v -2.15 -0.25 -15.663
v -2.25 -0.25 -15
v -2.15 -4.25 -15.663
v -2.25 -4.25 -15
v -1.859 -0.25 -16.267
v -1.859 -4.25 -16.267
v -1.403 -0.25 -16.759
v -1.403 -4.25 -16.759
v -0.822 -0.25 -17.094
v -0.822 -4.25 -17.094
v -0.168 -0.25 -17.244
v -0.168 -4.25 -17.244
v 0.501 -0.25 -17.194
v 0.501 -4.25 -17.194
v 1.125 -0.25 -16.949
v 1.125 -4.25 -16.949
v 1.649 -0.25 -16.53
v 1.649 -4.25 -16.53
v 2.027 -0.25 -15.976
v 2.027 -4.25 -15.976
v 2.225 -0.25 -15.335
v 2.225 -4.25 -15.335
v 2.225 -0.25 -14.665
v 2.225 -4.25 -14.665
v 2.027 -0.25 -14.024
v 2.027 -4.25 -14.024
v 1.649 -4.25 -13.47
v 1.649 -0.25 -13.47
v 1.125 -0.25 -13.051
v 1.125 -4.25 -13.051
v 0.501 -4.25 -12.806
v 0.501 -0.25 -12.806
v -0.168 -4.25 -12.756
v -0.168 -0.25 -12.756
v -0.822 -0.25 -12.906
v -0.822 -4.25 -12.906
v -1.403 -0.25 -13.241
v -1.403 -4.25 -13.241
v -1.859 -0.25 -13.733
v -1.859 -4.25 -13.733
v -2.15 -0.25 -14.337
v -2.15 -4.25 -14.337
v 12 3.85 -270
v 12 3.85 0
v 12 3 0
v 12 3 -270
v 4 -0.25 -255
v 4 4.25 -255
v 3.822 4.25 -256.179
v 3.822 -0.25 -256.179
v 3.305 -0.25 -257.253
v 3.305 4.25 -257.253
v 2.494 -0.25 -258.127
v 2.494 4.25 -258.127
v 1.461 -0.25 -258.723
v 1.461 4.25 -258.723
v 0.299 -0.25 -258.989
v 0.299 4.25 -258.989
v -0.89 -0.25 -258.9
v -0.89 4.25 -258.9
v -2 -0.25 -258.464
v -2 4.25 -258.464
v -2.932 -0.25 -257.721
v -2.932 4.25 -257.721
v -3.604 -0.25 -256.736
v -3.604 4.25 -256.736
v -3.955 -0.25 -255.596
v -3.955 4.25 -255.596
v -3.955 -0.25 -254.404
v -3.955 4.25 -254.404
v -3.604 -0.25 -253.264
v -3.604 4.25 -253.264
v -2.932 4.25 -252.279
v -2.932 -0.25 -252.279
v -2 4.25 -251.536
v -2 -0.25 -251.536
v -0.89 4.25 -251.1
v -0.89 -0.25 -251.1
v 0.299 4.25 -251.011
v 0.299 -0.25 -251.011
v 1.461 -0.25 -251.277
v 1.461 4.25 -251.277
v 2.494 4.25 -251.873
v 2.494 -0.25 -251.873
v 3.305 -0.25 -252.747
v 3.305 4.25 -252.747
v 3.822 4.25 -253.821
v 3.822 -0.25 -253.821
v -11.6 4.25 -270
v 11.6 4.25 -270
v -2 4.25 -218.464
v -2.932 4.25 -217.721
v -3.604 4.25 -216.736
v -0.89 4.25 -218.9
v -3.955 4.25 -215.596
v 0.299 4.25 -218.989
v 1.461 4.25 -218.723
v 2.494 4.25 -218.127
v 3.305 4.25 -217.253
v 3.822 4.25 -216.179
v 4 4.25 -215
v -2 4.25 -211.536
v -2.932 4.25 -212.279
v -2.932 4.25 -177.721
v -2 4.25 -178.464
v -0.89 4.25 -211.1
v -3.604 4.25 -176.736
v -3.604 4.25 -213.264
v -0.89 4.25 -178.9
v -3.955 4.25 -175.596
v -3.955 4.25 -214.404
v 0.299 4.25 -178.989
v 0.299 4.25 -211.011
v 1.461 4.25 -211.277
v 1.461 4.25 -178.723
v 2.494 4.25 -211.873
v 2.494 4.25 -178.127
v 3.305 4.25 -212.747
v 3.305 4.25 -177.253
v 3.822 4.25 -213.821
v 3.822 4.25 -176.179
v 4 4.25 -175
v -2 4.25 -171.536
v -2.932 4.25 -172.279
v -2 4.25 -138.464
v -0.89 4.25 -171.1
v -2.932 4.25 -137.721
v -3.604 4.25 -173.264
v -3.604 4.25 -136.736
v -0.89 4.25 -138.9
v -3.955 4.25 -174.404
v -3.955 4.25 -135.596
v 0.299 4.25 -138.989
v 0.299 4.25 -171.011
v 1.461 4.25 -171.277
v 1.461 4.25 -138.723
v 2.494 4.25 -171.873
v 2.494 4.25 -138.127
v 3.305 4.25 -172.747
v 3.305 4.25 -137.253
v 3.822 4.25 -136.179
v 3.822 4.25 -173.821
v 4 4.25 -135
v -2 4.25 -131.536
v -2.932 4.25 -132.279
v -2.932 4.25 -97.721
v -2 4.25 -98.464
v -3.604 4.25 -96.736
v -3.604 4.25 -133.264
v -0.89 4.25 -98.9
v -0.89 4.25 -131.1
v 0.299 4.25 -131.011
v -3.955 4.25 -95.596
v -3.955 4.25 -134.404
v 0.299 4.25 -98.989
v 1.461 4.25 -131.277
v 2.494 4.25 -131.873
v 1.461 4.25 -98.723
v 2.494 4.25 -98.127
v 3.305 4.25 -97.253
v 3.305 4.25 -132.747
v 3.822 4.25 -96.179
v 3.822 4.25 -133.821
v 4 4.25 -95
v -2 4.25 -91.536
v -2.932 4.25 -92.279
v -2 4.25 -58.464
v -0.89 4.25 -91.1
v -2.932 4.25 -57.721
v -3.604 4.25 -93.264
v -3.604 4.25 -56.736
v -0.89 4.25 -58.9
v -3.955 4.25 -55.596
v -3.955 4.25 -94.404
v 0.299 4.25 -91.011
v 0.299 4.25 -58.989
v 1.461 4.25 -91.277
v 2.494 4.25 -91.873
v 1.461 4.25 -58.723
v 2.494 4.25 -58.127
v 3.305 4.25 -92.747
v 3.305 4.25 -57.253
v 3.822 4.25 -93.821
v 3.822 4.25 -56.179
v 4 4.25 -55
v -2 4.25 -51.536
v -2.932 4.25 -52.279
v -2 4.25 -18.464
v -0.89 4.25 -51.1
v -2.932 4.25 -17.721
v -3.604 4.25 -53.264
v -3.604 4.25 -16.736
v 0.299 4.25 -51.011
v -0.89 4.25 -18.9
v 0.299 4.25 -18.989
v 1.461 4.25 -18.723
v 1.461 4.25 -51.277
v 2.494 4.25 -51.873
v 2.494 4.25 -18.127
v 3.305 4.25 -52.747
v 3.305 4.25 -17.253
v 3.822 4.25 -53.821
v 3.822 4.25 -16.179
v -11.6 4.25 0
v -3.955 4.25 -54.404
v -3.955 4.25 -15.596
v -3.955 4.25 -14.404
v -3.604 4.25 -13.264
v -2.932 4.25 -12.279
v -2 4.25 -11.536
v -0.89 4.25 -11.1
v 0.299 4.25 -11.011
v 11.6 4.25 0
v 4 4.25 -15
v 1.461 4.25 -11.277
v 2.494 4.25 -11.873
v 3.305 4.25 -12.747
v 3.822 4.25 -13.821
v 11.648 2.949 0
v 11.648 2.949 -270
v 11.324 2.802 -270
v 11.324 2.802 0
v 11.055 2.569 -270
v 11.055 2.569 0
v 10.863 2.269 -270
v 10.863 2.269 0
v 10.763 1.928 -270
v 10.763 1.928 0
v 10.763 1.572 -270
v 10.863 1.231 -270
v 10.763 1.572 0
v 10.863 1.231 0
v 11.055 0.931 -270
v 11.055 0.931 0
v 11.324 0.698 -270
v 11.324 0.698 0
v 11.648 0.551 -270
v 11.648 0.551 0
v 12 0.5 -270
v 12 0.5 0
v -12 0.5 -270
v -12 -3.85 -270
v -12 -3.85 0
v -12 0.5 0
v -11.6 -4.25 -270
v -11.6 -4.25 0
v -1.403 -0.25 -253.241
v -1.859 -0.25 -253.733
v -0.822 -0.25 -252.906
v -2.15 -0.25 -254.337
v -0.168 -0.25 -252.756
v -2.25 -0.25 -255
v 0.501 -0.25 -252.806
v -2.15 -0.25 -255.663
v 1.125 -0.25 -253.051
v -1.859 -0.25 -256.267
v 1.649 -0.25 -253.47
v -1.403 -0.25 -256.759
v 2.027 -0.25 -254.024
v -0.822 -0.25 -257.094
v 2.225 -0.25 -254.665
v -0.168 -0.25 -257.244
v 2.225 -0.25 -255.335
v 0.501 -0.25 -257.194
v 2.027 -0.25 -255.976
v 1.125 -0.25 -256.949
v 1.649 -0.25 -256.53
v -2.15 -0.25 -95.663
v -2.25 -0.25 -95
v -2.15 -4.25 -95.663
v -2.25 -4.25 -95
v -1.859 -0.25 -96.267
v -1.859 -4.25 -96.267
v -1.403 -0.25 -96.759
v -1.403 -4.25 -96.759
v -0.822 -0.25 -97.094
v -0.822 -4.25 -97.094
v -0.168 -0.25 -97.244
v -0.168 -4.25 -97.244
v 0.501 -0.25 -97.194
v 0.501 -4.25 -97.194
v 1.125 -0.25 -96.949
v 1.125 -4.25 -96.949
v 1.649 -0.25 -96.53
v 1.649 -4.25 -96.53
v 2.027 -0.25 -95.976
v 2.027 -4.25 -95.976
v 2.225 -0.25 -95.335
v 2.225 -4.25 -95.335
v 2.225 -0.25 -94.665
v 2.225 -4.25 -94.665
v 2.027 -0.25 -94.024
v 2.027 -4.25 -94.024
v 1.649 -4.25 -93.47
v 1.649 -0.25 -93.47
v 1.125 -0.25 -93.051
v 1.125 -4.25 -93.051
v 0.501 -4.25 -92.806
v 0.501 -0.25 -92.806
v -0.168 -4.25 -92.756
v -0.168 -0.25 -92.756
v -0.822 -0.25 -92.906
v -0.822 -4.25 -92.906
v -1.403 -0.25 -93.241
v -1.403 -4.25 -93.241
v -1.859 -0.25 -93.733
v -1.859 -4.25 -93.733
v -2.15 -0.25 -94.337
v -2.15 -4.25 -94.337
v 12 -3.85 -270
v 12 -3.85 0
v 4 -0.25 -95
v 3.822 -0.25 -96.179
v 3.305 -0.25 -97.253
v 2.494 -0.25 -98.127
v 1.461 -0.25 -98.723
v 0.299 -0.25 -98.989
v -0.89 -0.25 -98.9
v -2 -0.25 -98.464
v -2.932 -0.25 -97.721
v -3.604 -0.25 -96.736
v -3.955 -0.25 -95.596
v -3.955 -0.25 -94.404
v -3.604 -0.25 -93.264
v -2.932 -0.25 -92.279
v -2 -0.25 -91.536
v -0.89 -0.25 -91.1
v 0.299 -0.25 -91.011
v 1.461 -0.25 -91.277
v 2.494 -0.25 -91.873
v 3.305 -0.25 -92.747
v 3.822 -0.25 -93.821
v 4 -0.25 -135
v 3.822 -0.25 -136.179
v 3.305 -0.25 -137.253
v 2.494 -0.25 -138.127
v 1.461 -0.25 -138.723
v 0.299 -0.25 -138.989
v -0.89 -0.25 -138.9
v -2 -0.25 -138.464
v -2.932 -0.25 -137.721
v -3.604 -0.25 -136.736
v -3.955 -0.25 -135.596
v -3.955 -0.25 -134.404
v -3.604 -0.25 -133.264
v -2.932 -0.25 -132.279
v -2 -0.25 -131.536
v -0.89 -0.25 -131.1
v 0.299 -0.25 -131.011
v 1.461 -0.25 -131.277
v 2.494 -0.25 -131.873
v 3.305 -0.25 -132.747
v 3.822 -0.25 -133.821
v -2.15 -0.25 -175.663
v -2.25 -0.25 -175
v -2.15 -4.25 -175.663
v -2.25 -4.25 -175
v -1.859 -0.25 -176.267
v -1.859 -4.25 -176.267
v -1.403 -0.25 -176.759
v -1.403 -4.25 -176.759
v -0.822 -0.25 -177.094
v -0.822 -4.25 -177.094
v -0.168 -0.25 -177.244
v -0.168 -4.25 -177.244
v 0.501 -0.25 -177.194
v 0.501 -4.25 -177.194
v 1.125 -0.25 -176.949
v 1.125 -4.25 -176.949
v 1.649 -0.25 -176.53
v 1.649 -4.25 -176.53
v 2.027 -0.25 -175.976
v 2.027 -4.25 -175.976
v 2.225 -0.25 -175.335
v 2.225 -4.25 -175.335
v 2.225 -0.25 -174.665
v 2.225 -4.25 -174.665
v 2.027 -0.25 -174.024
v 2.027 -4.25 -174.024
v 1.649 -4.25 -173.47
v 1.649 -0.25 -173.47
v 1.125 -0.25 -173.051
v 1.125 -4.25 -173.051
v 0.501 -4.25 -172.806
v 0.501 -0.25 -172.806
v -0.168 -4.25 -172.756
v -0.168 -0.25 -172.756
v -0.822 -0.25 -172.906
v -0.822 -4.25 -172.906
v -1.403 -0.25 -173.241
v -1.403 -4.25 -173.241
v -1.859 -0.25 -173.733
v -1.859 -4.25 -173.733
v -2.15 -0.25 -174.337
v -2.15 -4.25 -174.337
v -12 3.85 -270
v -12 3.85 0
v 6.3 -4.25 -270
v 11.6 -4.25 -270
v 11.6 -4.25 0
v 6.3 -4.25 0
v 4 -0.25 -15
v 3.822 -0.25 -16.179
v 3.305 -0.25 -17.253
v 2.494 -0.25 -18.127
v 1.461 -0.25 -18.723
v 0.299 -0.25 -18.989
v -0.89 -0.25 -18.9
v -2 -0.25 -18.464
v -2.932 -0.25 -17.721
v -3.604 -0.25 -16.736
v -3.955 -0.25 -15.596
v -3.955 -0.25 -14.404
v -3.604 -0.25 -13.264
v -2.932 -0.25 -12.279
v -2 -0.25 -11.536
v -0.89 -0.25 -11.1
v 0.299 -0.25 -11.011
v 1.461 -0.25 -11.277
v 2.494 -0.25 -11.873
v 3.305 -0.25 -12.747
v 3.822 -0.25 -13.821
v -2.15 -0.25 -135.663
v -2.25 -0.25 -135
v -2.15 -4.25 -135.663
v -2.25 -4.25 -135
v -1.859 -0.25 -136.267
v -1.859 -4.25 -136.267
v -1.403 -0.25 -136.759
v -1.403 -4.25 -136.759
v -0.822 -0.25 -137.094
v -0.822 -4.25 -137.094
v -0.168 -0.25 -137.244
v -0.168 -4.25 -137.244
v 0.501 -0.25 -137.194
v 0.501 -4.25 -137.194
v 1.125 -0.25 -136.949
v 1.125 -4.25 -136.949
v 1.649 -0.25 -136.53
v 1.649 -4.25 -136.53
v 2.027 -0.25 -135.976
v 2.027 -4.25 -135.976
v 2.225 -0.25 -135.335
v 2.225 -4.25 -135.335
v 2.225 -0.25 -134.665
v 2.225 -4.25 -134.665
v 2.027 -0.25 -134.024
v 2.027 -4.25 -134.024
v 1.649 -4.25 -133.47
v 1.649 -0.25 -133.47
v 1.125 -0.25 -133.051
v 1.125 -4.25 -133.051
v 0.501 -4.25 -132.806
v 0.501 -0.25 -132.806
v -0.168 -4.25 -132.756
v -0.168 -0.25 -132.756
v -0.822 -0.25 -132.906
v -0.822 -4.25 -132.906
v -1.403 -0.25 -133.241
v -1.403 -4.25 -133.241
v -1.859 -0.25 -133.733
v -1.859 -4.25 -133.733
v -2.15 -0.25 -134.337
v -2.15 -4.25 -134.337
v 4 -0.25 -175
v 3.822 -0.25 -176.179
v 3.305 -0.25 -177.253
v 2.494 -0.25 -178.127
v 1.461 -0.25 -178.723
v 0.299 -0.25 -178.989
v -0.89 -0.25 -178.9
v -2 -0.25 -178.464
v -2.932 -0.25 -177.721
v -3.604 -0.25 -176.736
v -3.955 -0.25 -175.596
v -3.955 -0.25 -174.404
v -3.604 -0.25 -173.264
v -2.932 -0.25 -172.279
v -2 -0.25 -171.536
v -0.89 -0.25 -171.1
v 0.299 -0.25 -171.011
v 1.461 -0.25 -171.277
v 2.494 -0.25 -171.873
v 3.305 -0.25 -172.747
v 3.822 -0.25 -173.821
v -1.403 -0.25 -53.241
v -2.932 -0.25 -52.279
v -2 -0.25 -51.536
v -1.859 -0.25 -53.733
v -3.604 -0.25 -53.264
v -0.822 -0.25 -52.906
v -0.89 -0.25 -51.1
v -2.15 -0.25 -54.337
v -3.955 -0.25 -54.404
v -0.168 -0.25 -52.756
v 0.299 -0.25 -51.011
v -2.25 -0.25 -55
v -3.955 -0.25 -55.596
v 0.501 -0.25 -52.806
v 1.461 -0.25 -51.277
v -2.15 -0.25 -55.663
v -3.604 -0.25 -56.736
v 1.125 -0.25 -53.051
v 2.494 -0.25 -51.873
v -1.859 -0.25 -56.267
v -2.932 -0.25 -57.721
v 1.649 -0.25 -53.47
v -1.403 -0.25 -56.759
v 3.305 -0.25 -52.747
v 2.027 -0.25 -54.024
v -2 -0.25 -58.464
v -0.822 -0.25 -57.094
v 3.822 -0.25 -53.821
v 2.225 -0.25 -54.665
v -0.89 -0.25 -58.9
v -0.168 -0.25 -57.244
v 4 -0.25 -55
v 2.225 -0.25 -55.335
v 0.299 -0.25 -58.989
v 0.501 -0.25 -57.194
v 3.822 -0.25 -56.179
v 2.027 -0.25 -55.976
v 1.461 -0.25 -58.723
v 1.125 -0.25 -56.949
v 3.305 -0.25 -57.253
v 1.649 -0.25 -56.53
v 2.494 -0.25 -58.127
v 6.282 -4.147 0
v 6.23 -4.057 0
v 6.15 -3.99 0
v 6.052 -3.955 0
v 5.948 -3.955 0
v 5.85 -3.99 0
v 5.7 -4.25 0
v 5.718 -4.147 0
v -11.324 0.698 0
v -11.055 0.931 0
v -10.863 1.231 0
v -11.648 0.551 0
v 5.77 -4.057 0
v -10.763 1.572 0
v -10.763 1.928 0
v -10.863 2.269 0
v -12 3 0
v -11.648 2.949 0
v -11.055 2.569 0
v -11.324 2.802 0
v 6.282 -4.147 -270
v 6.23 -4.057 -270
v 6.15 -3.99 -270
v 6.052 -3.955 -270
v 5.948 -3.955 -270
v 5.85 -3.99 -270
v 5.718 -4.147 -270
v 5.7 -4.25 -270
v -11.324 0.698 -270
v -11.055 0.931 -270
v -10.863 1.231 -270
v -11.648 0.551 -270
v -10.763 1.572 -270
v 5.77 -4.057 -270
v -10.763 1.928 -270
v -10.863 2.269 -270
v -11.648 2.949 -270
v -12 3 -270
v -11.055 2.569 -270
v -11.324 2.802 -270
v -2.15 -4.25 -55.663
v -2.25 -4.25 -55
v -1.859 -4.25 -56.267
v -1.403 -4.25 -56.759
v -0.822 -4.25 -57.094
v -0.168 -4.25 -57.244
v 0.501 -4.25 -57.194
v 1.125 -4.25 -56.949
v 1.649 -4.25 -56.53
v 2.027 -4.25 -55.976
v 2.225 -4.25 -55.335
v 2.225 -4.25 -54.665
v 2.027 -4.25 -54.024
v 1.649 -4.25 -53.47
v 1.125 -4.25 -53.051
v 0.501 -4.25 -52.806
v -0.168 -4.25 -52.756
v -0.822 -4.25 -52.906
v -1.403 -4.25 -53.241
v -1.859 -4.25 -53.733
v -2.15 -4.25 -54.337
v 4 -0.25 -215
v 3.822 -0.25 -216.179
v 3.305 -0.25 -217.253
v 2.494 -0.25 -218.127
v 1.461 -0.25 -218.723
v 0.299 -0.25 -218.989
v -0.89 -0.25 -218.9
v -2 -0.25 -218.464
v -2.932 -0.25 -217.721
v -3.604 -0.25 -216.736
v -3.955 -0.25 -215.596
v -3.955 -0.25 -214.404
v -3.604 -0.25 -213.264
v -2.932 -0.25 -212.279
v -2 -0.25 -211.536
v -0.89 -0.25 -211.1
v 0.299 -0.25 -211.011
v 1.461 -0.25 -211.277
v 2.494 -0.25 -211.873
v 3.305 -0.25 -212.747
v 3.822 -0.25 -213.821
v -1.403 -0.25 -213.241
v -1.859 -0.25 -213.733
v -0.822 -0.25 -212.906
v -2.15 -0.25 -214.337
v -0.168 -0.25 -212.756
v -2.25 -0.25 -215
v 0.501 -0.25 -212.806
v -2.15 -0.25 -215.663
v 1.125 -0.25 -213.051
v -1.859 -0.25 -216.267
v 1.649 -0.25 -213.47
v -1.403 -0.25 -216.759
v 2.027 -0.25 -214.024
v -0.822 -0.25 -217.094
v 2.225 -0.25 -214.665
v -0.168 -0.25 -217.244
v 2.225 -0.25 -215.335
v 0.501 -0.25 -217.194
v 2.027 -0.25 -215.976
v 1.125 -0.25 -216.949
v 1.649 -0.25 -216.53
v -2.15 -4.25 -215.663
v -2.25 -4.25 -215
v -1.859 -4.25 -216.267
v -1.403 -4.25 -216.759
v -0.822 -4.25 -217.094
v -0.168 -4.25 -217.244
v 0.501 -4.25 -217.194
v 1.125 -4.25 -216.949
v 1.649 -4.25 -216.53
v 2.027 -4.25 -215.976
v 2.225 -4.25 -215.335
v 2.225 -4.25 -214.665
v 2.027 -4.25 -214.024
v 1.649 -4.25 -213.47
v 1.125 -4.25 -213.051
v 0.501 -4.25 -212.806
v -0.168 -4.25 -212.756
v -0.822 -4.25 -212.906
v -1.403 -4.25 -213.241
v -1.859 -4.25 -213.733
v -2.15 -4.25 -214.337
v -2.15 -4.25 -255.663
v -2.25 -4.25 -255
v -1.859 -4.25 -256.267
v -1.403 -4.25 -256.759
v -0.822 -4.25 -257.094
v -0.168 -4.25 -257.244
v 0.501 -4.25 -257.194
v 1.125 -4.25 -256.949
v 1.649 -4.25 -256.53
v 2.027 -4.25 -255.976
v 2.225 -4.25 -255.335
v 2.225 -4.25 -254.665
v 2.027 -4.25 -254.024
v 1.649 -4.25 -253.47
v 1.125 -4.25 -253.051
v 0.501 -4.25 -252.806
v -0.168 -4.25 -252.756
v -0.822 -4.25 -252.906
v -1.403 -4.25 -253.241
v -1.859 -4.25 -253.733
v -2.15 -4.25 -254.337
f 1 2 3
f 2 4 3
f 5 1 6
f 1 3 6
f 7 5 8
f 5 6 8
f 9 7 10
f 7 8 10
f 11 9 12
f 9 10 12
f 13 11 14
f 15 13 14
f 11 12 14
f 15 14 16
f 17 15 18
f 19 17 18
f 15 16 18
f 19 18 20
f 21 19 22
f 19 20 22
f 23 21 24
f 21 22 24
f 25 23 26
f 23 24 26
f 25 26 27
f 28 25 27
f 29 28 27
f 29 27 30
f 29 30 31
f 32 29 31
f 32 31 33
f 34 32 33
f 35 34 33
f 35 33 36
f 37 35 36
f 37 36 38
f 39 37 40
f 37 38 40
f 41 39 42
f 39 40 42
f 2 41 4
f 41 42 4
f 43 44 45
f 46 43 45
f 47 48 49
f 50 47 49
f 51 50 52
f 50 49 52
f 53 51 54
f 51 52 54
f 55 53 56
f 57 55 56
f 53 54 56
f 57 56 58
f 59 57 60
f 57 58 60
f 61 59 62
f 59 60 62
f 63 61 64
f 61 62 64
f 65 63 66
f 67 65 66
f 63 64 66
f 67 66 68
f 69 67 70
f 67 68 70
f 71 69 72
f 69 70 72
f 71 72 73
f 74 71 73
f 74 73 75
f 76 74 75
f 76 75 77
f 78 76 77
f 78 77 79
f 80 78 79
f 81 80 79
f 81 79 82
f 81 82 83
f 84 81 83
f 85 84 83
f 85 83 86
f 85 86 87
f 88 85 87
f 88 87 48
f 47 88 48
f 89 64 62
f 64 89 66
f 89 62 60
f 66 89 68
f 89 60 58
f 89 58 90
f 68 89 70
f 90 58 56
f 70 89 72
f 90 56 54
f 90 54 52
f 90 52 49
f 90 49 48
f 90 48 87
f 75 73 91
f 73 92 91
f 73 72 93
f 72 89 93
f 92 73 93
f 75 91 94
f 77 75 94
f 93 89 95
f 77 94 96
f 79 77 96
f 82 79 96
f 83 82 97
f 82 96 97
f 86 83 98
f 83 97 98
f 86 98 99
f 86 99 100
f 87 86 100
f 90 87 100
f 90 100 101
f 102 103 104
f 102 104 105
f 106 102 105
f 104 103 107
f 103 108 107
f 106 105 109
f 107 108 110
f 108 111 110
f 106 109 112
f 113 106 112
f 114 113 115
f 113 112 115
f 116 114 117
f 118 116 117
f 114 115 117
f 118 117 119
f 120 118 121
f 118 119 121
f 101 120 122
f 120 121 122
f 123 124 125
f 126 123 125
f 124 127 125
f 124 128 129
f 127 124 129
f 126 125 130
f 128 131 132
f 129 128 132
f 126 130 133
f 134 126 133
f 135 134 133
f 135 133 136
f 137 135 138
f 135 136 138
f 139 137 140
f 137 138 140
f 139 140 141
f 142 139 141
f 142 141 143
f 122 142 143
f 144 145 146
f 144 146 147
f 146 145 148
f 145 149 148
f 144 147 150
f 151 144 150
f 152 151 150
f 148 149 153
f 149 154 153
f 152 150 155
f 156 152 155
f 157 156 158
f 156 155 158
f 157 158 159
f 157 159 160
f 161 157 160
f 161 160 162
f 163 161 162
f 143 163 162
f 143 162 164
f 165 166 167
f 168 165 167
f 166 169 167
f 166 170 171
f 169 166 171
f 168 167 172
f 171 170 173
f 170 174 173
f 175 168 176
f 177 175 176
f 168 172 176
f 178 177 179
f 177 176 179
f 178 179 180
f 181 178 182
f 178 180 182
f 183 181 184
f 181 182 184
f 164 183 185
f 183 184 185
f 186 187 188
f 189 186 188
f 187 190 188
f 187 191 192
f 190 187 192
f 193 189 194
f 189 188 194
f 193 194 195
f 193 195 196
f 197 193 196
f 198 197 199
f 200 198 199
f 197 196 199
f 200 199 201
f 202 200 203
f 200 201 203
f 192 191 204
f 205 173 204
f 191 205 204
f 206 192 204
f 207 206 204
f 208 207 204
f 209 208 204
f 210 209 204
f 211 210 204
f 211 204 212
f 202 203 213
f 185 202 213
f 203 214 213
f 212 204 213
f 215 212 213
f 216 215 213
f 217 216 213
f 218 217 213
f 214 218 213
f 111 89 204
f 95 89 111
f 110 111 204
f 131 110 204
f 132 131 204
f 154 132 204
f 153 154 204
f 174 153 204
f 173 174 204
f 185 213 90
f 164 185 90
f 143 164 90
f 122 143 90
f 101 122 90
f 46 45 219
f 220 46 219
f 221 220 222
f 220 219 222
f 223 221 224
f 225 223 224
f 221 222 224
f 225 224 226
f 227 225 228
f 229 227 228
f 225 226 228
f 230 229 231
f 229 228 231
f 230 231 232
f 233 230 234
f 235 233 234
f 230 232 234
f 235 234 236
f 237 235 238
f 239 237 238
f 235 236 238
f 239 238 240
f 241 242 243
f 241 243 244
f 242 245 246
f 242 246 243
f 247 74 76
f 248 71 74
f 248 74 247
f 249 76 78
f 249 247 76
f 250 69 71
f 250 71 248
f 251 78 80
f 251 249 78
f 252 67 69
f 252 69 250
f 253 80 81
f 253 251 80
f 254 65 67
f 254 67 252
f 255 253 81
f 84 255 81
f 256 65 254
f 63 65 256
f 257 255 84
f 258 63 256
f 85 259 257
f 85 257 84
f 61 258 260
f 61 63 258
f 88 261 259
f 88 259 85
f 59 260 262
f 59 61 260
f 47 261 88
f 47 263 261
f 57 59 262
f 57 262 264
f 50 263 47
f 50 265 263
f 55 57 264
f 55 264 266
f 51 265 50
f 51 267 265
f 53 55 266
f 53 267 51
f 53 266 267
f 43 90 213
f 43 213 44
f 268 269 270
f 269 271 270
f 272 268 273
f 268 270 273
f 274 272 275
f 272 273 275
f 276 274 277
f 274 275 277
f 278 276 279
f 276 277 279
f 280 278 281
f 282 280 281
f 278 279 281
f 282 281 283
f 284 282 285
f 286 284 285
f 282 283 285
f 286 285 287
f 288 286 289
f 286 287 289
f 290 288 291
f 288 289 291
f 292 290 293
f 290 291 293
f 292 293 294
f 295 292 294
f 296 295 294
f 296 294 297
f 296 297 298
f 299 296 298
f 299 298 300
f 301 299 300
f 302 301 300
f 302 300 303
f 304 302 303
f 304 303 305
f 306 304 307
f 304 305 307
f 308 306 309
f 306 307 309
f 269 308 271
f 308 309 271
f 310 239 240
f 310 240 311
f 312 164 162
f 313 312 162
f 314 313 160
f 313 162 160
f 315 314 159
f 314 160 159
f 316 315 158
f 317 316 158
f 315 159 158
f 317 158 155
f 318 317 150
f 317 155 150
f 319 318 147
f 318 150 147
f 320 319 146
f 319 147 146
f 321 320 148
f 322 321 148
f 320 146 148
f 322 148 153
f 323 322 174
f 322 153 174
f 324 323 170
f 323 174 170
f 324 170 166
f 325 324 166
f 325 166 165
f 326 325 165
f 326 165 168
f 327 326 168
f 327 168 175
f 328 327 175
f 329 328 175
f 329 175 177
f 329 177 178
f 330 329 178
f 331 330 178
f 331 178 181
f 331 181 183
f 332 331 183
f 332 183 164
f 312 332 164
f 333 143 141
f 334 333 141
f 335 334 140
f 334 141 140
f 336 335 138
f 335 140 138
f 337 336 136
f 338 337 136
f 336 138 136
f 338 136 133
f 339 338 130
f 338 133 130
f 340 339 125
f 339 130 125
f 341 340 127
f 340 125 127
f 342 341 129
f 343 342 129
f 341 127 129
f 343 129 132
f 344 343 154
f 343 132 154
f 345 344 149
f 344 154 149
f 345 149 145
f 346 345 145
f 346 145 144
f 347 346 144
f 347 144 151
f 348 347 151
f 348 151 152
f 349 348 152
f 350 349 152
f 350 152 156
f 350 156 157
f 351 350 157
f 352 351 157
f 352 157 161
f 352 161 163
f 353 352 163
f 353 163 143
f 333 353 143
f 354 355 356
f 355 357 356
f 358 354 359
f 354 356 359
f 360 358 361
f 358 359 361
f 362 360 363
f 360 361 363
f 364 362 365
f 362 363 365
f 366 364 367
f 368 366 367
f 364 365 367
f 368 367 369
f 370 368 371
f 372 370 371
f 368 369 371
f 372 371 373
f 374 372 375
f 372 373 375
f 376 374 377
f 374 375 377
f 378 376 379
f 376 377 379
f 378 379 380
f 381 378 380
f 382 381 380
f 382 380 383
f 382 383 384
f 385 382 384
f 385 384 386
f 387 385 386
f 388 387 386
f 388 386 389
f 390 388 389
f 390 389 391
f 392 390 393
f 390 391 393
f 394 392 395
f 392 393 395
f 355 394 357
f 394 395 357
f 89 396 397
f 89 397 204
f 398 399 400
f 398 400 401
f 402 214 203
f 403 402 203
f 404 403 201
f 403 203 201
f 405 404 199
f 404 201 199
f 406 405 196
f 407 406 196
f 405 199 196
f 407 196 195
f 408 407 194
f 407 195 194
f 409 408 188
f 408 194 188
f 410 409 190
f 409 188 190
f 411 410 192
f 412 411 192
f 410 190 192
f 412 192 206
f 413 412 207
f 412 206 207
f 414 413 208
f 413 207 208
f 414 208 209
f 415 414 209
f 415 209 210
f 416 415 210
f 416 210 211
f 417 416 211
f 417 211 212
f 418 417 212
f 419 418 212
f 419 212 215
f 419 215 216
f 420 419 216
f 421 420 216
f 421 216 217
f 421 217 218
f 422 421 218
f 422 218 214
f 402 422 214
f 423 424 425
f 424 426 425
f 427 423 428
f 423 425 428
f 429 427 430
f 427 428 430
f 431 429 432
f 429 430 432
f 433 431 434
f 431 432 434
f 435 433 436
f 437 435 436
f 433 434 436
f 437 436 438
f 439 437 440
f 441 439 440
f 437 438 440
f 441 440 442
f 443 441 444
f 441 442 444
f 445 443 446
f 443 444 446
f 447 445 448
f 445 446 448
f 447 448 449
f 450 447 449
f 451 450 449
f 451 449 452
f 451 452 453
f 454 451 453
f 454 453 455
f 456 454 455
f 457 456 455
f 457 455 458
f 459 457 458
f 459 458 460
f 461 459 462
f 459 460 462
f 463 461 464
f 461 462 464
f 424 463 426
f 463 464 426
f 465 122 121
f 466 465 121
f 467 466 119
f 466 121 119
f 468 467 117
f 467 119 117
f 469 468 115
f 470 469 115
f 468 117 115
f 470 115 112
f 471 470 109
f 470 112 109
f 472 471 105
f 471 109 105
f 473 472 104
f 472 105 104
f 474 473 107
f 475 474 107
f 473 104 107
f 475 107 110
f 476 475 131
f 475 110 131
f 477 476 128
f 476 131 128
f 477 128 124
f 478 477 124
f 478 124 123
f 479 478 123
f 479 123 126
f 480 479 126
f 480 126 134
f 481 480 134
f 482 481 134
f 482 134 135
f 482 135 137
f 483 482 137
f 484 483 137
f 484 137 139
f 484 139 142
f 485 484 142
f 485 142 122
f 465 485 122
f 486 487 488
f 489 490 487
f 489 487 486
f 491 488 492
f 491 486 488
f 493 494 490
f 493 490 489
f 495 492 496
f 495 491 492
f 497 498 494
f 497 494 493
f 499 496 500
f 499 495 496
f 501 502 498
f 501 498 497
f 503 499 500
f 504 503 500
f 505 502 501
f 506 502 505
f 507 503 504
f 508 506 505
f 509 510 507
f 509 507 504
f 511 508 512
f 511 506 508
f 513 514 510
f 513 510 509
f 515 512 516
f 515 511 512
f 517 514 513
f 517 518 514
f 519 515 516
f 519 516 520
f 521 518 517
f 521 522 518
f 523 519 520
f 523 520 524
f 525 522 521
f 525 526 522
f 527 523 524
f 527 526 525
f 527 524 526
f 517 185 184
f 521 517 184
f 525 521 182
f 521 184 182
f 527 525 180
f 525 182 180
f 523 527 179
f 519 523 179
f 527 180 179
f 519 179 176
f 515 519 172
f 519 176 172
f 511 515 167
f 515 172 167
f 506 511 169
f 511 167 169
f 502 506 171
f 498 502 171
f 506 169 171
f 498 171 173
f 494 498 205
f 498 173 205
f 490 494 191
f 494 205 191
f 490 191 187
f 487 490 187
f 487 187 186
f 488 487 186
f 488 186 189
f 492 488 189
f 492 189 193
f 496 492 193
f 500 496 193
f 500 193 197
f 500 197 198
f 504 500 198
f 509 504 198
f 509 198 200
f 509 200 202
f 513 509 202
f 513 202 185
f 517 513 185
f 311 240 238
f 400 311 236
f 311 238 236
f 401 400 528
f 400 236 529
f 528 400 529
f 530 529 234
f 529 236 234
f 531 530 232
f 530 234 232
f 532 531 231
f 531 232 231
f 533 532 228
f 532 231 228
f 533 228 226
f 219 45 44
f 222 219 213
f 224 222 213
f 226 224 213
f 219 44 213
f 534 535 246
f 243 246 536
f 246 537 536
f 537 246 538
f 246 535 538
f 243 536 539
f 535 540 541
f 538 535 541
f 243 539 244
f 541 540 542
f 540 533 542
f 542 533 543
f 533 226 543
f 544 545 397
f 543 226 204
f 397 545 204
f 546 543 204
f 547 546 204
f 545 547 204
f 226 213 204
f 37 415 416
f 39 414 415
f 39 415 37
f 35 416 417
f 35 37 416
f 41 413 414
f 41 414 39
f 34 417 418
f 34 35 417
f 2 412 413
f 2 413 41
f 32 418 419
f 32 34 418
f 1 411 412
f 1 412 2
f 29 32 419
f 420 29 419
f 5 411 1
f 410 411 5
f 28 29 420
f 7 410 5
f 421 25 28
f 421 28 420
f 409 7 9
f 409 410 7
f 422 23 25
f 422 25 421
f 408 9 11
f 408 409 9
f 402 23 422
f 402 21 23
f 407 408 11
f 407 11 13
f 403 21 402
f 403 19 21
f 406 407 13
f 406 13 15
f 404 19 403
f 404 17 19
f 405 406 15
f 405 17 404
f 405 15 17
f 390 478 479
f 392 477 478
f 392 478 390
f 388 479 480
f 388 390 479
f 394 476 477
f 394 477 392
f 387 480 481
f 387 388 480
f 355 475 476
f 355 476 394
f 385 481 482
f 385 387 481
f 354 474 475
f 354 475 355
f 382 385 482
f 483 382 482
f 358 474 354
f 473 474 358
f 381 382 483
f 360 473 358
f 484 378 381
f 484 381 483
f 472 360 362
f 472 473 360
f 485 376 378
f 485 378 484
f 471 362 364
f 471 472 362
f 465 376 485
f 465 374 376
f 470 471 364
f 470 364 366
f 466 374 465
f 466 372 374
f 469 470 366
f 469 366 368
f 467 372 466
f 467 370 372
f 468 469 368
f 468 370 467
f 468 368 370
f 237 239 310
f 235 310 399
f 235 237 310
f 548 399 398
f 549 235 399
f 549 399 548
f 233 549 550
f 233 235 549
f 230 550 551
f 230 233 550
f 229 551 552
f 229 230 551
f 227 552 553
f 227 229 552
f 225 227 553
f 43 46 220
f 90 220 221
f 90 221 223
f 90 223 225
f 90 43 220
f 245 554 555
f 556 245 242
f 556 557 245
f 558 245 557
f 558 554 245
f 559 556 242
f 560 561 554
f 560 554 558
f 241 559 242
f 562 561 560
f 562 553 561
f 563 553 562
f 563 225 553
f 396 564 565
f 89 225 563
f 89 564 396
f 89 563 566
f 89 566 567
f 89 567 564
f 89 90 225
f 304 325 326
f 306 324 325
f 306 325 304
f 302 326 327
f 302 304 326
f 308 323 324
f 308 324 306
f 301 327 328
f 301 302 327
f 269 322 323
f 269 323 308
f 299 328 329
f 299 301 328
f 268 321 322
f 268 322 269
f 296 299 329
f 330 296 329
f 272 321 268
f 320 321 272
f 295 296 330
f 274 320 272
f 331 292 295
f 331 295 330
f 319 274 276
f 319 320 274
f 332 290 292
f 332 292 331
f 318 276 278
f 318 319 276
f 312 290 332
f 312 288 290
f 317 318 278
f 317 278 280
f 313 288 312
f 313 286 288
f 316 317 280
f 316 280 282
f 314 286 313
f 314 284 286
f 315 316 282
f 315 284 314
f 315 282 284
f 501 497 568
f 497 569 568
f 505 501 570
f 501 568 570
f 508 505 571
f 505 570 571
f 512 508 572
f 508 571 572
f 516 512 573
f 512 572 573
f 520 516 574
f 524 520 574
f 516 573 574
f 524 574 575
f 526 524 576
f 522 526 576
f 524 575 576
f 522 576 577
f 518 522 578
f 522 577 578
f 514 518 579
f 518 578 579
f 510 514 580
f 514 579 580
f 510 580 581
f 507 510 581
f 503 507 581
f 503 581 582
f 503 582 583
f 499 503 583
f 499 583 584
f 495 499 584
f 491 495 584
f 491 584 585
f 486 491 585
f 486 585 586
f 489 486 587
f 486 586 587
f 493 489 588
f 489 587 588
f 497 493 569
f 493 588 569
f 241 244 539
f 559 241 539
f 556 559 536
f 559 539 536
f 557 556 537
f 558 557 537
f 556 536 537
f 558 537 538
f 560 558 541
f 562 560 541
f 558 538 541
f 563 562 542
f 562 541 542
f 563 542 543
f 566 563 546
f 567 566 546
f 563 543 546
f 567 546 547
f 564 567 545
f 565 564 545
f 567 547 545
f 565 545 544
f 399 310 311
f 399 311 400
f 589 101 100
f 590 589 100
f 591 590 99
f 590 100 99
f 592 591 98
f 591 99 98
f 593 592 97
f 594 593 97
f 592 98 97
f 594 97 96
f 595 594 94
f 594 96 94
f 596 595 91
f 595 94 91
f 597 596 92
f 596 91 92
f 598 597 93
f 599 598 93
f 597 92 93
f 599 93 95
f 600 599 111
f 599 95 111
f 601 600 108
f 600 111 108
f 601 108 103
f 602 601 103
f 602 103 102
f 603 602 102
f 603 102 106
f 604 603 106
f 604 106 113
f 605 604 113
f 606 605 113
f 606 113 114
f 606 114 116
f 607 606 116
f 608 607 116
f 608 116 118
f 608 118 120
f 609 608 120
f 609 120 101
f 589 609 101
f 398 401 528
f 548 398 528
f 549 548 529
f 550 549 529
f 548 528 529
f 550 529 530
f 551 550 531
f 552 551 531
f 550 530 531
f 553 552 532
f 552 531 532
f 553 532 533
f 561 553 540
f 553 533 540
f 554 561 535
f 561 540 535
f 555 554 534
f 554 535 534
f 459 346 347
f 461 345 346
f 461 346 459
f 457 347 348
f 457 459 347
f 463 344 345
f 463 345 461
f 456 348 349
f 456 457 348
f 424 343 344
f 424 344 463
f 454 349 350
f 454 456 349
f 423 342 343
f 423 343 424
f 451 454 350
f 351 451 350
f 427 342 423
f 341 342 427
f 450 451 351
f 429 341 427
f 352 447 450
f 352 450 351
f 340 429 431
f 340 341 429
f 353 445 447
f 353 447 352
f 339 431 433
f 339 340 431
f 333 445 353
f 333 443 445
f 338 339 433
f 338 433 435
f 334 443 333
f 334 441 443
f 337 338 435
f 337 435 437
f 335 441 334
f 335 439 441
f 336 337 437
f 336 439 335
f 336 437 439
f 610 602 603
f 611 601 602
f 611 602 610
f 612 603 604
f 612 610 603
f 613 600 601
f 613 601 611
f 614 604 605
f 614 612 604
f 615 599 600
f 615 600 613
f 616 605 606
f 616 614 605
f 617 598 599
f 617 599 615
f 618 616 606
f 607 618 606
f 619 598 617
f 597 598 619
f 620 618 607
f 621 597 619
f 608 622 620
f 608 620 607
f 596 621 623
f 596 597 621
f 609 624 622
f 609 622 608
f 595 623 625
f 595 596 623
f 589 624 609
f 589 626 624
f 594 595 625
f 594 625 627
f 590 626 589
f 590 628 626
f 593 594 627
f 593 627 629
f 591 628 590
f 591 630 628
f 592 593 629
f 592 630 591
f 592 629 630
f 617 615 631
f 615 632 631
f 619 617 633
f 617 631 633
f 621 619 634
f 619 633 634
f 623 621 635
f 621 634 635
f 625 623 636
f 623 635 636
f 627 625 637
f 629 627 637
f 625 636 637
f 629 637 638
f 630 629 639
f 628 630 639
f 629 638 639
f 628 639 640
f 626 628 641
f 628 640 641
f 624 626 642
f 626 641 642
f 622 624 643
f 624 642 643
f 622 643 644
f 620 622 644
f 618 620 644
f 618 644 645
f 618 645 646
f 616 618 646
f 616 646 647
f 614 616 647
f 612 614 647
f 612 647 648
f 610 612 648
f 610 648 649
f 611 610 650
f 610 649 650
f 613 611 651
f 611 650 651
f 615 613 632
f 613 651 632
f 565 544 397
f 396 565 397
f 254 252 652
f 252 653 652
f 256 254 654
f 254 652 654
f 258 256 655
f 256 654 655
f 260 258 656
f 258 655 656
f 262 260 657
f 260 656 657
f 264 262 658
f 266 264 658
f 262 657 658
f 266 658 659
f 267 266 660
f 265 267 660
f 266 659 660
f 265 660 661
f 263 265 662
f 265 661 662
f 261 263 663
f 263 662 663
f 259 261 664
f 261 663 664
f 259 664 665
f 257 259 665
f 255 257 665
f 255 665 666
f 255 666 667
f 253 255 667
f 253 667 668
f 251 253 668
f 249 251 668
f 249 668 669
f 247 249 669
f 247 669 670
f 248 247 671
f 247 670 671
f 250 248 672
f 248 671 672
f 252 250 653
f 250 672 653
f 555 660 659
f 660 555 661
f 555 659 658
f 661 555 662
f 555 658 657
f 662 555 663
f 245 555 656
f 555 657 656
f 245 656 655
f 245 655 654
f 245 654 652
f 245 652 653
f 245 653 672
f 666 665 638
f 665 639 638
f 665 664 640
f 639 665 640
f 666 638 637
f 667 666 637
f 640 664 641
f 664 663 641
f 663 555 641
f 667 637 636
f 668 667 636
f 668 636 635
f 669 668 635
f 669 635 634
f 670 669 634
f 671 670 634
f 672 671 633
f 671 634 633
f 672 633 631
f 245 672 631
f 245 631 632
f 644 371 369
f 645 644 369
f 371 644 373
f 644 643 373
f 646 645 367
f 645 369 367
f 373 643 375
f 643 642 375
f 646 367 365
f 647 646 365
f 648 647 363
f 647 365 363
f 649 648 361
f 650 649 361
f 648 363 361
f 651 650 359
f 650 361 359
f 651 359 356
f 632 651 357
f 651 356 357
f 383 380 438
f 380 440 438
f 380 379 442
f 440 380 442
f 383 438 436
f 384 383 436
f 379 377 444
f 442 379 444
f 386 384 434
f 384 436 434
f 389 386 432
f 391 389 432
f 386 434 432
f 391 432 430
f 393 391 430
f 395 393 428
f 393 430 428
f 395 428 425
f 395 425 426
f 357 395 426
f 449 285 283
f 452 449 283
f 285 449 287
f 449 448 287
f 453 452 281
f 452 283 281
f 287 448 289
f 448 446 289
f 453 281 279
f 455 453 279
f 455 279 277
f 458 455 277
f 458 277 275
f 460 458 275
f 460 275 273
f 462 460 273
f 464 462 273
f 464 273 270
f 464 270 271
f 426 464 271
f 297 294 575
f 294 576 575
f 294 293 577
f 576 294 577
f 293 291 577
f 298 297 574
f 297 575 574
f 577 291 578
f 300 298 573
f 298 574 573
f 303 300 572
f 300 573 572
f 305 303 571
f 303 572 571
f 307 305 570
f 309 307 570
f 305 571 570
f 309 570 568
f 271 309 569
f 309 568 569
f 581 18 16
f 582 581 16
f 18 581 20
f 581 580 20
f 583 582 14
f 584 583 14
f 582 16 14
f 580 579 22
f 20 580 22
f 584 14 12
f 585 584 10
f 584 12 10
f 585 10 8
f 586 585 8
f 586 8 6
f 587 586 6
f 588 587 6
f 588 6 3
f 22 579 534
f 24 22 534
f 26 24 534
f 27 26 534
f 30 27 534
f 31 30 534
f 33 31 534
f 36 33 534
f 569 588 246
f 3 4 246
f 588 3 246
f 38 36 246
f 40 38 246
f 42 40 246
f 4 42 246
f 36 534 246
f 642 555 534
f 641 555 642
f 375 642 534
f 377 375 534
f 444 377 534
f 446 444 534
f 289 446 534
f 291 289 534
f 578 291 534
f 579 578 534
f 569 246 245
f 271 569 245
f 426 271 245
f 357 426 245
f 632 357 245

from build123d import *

# Parameters (mm, degrees)
EXTRUDE_1_DEPTH           = 270
HOLE_WIZARD_1_D           = 4.5
HOLE_WIZARD_1_CBORE_D     = 8
HOLE_WIZARD_1_CBORE_DEPTH = 4.5
PATTERN_LINEAR_1_COUNT    = 7
PATTERN_LINEAR_1_PITCH    = 40


with BuildPart() as part:
    # 草图1 → 凸台-拉伸1 (new body)
    with BuildSketch(Plane.XY):
        with BuildLine():
            Line((-12, 3), (-12, 3.85))
            Line((-12, 3.85), (-11.6, 4.25))
            Line((-11.6, 4.25), (11.6, 4.25))
            Line((11.6, 4.25), (12, 3.85))
            Line((12, 3.85), (12, 3))
            ThreePointArc((12, 3), (10.75, 1.75), (12, 0.5))
            Line((12, 0.5), (12, -3.85))
            Line((12, -3.85), (11.6, -4.25))
            Line((11.6, -4.25), (6.3, -4.25))
            ThreePointArc((6.3, -4.25), (6, -3.95), (5.7, -4.25))
            Line((5.7, -4.25), (-11.6, -4.25))
            Line((-11.6, -4.25), (-12, -3.85))
            Line((-12, -3.85), (-12, 0.5))
            ThreePointArc((-12, 0.5), (-10.75, 1.75), (-12, 3))
        make_face()
    extrude(amount=-EXTRUDE_1_DEPTH)

    # 打孔尺寸根据内六角圆柱头螺钉的类型1 (through all)
    with Locations(Plane(origin=(0, 4.25, 0), x_dir=(1, 0, 0), z_dir=(0, 1, 0))):
        with Locations((0, 15)):
            hole_wizard_1 = CounterBoreHole(HOLE_WIZARD_1_D / 2, HOLE_WIZARD_1_CBORE_D / 2, HOLE_WIZARD_1_CBORE_DEPTH)

    # 阵列(线性)1: 打孔尺寸根据内六角圆柱头螺钉的类型1 ×7
    with Locations(*[(0, 0, -i * PATTERN_LINEAR_1_PITCH) for i in range(1, PATTERN_LINEAR_1_COUNT)]):
        add(hole_wizard_1, mode=Mode.SUBTRACT)


solid = part.part
